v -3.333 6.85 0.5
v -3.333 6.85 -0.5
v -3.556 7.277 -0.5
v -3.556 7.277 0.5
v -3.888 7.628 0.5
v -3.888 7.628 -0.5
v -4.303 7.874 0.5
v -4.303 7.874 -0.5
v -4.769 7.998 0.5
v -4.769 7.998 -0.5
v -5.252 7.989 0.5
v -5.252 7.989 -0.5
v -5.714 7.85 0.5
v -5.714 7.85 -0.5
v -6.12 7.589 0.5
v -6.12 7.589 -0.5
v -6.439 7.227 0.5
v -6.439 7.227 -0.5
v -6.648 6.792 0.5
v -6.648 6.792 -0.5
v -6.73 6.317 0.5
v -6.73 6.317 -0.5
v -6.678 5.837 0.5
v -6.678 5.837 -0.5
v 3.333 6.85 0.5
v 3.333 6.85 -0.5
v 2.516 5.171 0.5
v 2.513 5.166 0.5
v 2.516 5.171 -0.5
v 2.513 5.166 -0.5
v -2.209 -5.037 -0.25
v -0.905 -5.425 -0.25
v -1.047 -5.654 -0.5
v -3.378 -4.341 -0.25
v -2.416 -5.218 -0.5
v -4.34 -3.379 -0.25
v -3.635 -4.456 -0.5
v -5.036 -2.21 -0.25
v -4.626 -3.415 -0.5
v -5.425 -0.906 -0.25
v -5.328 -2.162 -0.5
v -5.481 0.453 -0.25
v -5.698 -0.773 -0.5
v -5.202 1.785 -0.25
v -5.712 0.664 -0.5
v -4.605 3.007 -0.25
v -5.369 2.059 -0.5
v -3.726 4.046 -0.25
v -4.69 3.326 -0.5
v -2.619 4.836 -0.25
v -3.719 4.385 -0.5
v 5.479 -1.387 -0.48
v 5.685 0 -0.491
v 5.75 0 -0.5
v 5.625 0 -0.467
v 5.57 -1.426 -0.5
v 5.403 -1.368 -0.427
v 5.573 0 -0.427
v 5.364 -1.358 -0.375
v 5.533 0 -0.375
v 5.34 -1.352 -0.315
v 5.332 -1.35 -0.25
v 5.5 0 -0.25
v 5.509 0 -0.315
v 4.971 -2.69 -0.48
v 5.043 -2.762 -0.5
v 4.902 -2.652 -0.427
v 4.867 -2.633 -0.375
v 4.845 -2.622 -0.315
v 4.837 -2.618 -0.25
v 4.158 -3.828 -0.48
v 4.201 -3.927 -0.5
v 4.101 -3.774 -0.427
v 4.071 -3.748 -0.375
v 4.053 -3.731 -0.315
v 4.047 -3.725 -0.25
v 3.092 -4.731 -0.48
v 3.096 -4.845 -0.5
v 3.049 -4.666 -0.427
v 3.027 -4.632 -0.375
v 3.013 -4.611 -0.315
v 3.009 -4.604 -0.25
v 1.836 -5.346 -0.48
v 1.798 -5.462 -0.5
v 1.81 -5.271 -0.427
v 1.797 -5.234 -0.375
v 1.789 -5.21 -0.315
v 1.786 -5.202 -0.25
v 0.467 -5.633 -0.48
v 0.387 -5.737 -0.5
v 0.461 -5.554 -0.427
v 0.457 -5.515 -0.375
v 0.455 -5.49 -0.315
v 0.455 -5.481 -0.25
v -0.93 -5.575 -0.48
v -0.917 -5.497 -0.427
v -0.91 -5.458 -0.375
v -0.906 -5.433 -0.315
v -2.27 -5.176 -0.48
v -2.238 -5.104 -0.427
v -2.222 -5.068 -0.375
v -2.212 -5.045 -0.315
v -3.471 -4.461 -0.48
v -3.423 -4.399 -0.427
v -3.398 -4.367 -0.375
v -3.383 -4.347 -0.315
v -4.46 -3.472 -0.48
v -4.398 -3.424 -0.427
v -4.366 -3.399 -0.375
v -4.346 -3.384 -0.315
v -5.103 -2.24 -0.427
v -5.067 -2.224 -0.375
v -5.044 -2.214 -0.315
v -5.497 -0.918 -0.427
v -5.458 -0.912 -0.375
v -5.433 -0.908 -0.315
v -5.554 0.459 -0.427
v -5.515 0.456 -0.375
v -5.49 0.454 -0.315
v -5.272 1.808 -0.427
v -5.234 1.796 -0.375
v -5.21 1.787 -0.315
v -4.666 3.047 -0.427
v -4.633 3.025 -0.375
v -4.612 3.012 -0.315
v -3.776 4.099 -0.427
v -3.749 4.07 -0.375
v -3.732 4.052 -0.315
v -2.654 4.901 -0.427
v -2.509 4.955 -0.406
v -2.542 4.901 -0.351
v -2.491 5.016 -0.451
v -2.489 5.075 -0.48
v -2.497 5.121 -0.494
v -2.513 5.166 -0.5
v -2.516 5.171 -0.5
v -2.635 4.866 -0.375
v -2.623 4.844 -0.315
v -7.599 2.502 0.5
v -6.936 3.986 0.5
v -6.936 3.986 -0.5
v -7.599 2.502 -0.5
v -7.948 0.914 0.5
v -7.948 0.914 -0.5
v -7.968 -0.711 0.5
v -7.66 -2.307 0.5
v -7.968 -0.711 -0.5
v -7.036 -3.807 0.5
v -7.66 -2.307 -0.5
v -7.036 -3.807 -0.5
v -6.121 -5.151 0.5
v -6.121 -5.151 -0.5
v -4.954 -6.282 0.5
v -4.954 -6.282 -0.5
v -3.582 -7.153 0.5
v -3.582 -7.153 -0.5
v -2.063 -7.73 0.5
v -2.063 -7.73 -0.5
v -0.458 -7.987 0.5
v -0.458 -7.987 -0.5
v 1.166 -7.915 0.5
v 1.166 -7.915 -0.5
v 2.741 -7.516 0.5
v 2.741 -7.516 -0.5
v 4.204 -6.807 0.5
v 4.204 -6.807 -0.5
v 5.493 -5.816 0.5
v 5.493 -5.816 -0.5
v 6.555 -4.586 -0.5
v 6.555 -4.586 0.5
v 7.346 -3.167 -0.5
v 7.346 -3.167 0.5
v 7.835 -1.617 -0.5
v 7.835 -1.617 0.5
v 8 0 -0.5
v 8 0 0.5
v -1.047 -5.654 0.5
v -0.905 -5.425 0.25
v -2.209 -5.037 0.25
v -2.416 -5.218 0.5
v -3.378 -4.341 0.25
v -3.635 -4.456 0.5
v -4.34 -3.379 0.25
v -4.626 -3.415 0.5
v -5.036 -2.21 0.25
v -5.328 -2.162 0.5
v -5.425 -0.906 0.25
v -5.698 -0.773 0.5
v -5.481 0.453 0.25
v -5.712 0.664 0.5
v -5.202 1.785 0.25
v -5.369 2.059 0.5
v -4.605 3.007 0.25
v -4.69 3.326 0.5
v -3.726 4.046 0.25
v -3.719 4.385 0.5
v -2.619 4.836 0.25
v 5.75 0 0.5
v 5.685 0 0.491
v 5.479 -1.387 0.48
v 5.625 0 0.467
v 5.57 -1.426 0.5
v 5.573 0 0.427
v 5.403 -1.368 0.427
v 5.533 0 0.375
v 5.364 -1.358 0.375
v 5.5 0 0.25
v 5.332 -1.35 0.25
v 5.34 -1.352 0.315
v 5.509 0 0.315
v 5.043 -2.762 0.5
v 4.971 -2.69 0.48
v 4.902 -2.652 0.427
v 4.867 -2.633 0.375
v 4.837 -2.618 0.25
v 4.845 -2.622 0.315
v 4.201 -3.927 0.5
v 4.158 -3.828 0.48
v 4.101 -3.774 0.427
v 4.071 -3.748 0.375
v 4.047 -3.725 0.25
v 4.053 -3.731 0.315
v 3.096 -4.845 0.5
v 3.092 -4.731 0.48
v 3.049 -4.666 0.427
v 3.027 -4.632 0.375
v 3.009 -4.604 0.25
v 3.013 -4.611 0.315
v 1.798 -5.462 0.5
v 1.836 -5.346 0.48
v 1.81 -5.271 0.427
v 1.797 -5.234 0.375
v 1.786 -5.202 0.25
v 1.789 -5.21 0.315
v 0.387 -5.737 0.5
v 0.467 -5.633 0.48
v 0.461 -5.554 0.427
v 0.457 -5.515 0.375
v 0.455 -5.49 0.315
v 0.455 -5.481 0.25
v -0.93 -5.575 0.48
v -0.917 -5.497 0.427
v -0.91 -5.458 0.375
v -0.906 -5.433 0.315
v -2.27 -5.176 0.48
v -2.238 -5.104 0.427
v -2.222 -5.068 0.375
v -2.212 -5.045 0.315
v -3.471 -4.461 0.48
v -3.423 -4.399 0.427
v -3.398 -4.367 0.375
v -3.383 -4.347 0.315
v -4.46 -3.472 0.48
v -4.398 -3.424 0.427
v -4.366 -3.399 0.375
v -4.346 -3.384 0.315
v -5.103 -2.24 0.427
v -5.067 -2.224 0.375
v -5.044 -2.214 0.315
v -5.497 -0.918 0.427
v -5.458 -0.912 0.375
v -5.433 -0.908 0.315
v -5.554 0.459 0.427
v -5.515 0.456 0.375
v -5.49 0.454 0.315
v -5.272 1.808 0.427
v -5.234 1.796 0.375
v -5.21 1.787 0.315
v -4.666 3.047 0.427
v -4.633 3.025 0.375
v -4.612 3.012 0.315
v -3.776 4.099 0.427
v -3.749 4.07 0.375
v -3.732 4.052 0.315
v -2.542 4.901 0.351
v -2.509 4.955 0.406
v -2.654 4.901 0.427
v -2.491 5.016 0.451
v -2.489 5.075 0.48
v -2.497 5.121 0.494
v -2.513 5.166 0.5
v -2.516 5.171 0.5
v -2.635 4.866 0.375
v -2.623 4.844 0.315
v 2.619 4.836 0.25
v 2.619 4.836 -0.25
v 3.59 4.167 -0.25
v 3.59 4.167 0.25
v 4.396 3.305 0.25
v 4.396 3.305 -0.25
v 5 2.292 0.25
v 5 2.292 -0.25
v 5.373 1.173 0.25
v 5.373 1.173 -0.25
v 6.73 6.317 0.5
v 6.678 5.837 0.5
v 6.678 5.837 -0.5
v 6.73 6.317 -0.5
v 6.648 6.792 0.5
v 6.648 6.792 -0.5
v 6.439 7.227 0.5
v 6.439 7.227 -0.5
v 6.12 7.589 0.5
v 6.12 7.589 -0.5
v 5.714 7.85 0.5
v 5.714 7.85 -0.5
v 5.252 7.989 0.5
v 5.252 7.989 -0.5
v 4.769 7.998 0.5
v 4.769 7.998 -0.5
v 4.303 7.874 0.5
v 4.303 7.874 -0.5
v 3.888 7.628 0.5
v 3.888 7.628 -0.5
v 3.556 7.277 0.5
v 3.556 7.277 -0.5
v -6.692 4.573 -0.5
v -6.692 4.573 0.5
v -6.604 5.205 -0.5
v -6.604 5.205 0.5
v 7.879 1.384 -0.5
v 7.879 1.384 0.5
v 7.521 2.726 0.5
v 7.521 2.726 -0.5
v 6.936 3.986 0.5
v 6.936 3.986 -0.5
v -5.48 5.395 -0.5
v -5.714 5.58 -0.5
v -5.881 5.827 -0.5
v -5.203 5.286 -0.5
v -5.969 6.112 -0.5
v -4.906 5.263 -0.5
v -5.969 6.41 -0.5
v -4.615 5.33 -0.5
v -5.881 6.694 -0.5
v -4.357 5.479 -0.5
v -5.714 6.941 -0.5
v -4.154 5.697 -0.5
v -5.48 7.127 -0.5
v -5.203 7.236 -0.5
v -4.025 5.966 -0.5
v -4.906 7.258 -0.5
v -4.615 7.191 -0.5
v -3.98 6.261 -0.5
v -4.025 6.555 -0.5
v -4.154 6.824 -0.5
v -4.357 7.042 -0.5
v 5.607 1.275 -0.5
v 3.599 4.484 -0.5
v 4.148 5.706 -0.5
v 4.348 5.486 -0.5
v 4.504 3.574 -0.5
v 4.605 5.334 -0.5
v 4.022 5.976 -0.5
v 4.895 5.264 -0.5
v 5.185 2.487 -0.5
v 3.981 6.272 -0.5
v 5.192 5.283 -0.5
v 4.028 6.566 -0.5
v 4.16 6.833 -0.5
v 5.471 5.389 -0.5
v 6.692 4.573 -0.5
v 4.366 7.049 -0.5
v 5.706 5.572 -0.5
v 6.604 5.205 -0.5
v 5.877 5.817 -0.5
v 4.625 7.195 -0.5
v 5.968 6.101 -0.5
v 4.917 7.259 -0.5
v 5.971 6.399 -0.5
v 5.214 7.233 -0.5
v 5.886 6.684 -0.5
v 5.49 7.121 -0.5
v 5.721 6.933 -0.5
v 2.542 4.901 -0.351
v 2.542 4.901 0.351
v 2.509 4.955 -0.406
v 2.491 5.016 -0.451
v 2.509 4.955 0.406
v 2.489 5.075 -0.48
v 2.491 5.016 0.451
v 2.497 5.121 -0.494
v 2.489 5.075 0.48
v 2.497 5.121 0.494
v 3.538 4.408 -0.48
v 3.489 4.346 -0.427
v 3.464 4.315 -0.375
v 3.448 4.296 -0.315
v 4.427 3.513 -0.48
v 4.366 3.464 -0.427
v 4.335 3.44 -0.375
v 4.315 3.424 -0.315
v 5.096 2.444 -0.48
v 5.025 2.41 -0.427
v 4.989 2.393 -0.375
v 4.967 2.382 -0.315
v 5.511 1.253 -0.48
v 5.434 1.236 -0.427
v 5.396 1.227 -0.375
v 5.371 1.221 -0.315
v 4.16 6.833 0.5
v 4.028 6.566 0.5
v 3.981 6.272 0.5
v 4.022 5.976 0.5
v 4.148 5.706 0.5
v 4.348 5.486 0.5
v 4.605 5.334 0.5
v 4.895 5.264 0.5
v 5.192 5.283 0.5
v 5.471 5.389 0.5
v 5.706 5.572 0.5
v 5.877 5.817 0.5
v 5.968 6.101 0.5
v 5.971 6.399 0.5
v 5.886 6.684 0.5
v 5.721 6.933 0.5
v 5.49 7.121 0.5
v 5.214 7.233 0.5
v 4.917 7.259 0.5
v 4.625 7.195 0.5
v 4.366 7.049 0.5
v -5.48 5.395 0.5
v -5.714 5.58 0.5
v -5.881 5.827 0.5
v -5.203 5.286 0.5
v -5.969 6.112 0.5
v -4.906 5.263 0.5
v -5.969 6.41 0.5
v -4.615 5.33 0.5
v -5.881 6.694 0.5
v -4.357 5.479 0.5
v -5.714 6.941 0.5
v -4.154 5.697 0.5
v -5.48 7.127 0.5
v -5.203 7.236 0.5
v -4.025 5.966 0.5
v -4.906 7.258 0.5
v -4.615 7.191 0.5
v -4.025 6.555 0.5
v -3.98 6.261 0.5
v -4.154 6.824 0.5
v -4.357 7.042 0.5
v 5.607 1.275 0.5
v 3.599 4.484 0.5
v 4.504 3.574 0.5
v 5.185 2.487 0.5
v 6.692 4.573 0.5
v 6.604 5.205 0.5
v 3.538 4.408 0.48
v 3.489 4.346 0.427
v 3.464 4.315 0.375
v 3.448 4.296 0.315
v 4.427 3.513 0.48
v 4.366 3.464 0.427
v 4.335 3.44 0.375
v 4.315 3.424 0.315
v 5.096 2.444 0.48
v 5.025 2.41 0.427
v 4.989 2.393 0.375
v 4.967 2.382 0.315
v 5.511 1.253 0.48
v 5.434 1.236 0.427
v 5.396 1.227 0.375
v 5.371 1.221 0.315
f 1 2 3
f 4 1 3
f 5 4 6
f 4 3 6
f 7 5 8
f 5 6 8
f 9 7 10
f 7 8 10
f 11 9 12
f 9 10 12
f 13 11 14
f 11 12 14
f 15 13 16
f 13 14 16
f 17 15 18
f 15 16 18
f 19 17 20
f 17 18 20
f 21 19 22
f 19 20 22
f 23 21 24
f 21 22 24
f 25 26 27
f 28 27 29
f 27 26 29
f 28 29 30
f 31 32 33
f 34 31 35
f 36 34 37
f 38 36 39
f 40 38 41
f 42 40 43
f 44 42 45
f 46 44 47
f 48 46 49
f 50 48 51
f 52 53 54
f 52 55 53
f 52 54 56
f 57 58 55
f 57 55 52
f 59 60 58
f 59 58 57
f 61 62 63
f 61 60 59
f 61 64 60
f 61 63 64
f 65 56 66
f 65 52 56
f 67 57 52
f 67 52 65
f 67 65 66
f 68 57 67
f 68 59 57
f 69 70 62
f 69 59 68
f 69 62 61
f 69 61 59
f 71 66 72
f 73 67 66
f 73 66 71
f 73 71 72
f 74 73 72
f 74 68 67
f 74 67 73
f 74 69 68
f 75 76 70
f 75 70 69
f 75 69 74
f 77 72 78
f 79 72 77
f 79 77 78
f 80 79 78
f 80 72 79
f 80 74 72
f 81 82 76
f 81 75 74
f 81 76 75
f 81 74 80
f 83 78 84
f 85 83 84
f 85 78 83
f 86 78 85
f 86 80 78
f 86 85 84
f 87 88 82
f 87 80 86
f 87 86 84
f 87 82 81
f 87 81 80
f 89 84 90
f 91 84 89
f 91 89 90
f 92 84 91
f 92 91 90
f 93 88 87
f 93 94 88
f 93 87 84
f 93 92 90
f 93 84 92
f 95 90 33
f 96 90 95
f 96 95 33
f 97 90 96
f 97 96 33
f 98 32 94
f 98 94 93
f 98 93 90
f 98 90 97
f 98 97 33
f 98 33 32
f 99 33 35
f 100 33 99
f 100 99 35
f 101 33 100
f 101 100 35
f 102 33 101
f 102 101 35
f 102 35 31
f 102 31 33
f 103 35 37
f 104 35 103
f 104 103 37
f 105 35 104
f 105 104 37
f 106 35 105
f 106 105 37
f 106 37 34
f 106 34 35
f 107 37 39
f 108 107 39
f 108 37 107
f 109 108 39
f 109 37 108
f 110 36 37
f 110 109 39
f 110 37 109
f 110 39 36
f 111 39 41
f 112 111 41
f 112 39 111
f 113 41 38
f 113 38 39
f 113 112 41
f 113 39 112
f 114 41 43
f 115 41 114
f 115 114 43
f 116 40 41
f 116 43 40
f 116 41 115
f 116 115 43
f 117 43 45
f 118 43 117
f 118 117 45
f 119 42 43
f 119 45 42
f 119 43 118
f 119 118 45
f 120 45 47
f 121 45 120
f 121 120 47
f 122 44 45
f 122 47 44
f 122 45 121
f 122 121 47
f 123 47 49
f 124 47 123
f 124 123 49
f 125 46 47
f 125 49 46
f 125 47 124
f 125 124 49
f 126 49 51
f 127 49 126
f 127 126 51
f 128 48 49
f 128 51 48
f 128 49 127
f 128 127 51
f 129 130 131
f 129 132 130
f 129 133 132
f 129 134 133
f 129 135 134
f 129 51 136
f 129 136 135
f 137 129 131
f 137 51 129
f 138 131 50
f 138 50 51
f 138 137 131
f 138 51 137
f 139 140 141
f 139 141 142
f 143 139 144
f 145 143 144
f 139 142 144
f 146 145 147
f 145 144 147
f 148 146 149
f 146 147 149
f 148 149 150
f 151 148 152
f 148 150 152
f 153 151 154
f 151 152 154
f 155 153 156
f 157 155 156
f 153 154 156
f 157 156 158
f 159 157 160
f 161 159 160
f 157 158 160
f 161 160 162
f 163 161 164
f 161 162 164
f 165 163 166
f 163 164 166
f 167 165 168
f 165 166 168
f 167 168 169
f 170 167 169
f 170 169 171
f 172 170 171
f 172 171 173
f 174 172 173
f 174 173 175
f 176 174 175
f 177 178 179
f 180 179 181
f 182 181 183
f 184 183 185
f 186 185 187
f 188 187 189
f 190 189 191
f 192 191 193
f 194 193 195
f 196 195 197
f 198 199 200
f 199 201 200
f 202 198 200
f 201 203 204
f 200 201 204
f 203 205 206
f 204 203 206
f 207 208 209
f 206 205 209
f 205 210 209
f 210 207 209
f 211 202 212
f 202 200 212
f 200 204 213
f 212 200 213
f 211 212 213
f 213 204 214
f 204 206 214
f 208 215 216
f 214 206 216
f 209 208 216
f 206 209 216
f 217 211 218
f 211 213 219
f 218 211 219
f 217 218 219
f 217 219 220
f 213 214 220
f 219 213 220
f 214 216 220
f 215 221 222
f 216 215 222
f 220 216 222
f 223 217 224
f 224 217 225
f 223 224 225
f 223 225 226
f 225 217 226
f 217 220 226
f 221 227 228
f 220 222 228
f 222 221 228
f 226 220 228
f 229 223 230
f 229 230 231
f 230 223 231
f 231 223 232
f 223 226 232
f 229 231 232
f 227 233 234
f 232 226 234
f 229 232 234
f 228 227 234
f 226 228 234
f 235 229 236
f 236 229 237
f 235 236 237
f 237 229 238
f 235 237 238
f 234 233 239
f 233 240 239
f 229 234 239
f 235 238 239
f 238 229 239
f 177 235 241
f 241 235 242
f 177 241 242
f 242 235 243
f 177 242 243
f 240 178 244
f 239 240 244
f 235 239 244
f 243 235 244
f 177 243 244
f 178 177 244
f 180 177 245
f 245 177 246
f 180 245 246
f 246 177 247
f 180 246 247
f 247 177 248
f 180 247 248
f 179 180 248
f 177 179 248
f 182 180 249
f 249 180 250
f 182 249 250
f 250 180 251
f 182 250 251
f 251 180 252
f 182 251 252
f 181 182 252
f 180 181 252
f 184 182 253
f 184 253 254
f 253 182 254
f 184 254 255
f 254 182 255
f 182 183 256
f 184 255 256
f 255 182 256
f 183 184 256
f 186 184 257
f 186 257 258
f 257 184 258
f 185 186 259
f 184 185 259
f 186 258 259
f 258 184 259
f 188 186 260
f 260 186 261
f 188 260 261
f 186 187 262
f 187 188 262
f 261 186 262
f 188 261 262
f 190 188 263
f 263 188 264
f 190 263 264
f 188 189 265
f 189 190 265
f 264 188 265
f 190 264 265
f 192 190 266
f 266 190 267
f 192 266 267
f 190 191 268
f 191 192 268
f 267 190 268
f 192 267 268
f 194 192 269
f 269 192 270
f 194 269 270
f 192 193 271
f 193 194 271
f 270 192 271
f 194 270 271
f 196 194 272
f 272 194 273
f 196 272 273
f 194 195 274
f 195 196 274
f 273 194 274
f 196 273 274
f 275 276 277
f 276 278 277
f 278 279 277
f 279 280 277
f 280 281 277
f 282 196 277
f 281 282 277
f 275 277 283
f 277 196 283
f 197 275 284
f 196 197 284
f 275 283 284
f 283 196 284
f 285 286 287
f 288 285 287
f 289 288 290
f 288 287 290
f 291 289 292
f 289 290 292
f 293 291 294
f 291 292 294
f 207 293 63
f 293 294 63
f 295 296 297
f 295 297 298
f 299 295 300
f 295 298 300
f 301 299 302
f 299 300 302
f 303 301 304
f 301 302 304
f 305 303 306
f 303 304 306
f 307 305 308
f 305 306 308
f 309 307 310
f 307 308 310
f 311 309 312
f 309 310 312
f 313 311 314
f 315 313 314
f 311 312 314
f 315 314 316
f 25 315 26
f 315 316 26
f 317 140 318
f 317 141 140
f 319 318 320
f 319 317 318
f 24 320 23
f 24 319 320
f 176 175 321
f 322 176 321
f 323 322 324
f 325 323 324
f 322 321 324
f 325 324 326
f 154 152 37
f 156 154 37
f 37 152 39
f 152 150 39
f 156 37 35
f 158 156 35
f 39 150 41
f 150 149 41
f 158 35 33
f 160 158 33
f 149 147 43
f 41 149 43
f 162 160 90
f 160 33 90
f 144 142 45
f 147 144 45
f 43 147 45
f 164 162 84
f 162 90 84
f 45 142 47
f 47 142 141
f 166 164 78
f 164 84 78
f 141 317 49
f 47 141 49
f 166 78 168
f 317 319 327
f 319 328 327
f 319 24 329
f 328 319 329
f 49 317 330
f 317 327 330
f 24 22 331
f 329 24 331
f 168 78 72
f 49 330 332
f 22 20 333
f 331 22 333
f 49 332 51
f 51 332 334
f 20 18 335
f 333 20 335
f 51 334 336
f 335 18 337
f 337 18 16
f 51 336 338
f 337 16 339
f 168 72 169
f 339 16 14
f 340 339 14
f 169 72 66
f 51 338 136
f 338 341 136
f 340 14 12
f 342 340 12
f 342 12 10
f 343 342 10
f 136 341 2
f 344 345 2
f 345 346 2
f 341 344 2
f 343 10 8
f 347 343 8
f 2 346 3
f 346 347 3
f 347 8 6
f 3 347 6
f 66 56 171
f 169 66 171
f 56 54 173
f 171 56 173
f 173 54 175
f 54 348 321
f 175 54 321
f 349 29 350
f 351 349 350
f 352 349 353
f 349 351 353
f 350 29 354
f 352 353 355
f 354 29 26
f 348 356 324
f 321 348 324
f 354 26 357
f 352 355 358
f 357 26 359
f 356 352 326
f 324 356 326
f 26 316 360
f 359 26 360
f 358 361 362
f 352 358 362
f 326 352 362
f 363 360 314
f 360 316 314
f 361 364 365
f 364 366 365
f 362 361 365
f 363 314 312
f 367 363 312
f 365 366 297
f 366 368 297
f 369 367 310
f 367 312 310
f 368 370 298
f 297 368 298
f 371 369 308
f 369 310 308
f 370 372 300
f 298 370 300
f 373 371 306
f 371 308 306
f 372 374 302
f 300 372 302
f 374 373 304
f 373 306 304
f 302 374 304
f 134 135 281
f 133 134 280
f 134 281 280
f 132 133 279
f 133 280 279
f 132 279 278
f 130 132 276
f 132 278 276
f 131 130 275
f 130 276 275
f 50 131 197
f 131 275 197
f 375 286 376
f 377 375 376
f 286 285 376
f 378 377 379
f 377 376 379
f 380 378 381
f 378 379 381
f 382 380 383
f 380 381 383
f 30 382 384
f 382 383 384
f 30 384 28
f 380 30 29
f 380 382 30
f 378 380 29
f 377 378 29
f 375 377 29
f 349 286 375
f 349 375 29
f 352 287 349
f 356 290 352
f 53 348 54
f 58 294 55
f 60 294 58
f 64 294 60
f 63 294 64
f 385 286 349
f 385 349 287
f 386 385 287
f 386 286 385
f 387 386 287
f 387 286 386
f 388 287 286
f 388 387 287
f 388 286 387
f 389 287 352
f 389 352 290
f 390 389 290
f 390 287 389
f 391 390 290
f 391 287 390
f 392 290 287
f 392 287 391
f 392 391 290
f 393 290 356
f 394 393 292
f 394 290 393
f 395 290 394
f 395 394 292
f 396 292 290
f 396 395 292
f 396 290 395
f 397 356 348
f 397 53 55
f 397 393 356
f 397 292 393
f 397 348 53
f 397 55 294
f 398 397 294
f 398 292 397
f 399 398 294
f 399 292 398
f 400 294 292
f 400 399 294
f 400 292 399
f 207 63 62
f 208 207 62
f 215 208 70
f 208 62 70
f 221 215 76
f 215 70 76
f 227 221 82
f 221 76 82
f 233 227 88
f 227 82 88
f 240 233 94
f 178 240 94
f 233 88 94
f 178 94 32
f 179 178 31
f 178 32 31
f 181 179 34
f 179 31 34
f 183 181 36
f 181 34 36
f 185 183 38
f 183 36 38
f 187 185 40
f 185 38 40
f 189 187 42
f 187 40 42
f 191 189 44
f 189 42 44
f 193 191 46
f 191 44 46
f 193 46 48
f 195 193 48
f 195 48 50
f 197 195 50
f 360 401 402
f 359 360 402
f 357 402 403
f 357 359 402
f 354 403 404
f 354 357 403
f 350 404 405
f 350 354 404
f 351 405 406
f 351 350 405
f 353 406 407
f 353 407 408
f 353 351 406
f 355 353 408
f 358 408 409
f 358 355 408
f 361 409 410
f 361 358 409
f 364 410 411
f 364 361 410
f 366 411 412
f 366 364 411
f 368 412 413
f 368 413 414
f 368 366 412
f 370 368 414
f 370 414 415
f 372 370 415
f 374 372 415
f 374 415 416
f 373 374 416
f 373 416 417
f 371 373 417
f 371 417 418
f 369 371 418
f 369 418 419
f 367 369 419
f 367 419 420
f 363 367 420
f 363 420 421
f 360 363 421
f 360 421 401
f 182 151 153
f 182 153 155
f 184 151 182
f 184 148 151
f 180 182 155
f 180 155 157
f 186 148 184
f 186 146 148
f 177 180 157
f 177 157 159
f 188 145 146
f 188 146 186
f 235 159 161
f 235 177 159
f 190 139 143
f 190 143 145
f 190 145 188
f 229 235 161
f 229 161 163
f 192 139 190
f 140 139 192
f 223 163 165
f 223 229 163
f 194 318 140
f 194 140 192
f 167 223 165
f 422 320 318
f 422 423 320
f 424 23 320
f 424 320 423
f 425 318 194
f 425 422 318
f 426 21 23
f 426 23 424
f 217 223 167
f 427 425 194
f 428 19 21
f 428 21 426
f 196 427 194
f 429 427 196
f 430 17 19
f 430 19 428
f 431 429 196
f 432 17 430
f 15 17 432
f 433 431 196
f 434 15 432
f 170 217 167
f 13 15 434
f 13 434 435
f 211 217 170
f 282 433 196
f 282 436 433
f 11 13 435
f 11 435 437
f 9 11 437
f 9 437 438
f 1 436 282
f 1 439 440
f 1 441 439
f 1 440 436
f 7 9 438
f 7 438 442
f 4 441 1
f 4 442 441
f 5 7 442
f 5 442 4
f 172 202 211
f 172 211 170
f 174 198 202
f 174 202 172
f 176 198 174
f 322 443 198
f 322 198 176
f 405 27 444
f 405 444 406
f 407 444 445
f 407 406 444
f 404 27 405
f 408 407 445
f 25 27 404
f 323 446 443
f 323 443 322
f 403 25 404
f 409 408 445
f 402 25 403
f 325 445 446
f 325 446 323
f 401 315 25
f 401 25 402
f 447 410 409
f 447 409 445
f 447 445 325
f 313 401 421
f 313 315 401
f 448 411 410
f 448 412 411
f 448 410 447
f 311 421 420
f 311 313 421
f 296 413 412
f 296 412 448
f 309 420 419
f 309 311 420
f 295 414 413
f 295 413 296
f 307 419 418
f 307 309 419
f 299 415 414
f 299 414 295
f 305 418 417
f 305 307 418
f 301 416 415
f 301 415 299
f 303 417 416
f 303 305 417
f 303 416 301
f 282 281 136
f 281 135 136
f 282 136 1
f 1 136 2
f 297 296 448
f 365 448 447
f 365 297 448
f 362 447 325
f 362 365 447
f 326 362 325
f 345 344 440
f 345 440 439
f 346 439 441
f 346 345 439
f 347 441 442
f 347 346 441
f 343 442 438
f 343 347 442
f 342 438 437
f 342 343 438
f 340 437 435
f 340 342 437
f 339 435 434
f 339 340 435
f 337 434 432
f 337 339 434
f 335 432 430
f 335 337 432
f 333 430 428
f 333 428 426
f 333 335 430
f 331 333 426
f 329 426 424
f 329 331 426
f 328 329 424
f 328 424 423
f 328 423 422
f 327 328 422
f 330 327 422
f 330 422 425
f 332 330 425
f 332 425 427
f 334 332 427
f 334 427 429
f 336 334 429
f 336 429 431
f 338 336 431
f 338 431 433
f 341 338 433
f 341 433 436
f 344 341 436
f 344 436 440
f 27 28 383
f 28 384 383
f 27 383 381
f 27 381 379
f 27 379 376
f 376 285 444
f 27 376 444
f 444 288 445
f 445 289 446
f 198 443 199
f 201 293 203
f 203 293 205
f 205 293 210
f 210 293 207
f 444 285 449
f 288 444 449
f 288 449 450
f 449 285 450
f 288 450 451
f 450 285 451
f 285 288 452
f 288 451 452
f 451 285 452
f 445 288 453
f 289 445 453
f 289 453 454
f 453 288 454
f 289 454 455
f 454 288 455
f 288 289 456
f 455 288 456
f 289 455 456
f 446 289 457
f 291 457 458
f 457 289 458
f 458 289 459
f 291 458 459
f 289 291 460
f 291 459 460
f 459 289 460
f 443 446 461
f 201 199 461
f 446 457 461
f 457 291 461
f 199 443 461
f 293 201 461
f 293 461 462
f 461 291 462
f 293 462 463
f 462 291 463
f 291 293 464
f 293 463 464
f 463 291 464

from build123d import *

# Parameters (mm, degrees)
BOSS_EXTRUDE1_DEPTH      = 0.5
BOSS_EXTRUDE1_DEPTH_BACK = 0.5
BOSS_EXTRUDE2_START      = -0.5
SKETCH2_R                = 1.75
SKETCH2_R_2              = 1
BOSS_EXTRUDE2_DEPTH      = 1
FILLET1_R                = 2.5
CUT_EXTRUDE1_DEPTH       = 12.332242011
CUT_EXTRUDE1_DEPTH_BACK  = 12.332242011
SKETCH2_2_R              = 1
FILLET4_R                = 0.25


with BuildPart() as part:
    # Sketch1 → Boss-Extrude1 (new, two sides: drawn at the far end of the back side and taken through both)
    with BuildSketch(Plane.XY.offset(-BOSS_EXTRUDE1_DEPTH_BACK)):
        with BuildLine():
            ThreePointArc((8, 0), (6.782329983, 4.242640687), (3.5, 7.193747285))
            Line((3.5, 7.193747285), (2.40625, 4.945701258))
            ThreePointArc((2.40625, 4.945701258), (4.662851863, 2.916815472), (5.5, 0))
            ThreePointArc((5.5, 0), (-2.916815472, -4.662851863), (-2.40625, 4.945701258))
            Line((-2.40625, 4.945701258), (-3.5, 7.193747285))
            ThreePointArc((-3.5, 7.193747285), (-4.242640687, -6.782329983), (8, 0))
        make_face()
    extrude(amount=BOSS_EXTRUDE1_DEPTH + BOSS_EXTRUDE1_DEPTH_BACK)

    # Sketch2 → Boss-Extrude2 (add)
    # profile 1 of 2: a face of its own
    with BuildSketch(Plane.XY.offset(BOSS_EXTRUDE2_START)):
        with Locations((-4.980451069, 6.260599584)):
            Circle(SKETCH2_R)
        with Locations((-4.980451069, 6.260599584)):
            Circle(SKETCH2_R_2, mode=Mode.SUBTRACT)
    # profile 2 of 2: a face of its own
    with BuildSketch(Plane.XY.offset(BOSS_EXTRUDE2_START)):
        with Locations((4.980451069, 6.260599584)):
            Circle(SKETCH2_R)
        with Locations((4.980451069, 6.260599584)):
            Circle(SKETCH2_R_2, mode=Mode.SUBTRACT)
    extrude(amount=BOSS_EXTRUDE2_DEPTH)

    # Fillet1
    fillet1_edges = [part.edges().sort_by_distance(p)[0] for p in [
        (-6.222579772, 5.02787241, 0),
        (6.222579772, 5.02787241, 0),
    ]]
    fillet(fillet1_edges, radius=FILLET1_R)

    # Sketch2<2> → Cut-Extrude1 (cut, two sides: drawn at the far end of the back side and taken through both)
    with BuildSketch(Plane.XY.offset(-CUT_EXTRUDE1_DEPTH_BACK)):
        with Locations((-4.980451069, 6.260599584)):
            Circle(SKETCH2_2_R)
        with Locations((4.980451069, 6.260599584)):
            Circle(SKETCH2_2_R)
    extrude(amount=CUT_EXTRUDE1_DEPTH + CUT_EXTRUDE1_DEPTH_BACK, mode=Mode.SUBTRACT)

    # Fillet4
    fillet4_edges = [part.edges().sort_by_distance(p)[0] for p in [
        (0, -5.5, 0.5),
        (0, -5.5, -0.5),
        (2.40625, 4.945701258, 0),
        (-2.40625, 4.945701258, 0),
    ]]
    fillet(fillet4_edges, radius=FILLET4_R)


solid = part.part
